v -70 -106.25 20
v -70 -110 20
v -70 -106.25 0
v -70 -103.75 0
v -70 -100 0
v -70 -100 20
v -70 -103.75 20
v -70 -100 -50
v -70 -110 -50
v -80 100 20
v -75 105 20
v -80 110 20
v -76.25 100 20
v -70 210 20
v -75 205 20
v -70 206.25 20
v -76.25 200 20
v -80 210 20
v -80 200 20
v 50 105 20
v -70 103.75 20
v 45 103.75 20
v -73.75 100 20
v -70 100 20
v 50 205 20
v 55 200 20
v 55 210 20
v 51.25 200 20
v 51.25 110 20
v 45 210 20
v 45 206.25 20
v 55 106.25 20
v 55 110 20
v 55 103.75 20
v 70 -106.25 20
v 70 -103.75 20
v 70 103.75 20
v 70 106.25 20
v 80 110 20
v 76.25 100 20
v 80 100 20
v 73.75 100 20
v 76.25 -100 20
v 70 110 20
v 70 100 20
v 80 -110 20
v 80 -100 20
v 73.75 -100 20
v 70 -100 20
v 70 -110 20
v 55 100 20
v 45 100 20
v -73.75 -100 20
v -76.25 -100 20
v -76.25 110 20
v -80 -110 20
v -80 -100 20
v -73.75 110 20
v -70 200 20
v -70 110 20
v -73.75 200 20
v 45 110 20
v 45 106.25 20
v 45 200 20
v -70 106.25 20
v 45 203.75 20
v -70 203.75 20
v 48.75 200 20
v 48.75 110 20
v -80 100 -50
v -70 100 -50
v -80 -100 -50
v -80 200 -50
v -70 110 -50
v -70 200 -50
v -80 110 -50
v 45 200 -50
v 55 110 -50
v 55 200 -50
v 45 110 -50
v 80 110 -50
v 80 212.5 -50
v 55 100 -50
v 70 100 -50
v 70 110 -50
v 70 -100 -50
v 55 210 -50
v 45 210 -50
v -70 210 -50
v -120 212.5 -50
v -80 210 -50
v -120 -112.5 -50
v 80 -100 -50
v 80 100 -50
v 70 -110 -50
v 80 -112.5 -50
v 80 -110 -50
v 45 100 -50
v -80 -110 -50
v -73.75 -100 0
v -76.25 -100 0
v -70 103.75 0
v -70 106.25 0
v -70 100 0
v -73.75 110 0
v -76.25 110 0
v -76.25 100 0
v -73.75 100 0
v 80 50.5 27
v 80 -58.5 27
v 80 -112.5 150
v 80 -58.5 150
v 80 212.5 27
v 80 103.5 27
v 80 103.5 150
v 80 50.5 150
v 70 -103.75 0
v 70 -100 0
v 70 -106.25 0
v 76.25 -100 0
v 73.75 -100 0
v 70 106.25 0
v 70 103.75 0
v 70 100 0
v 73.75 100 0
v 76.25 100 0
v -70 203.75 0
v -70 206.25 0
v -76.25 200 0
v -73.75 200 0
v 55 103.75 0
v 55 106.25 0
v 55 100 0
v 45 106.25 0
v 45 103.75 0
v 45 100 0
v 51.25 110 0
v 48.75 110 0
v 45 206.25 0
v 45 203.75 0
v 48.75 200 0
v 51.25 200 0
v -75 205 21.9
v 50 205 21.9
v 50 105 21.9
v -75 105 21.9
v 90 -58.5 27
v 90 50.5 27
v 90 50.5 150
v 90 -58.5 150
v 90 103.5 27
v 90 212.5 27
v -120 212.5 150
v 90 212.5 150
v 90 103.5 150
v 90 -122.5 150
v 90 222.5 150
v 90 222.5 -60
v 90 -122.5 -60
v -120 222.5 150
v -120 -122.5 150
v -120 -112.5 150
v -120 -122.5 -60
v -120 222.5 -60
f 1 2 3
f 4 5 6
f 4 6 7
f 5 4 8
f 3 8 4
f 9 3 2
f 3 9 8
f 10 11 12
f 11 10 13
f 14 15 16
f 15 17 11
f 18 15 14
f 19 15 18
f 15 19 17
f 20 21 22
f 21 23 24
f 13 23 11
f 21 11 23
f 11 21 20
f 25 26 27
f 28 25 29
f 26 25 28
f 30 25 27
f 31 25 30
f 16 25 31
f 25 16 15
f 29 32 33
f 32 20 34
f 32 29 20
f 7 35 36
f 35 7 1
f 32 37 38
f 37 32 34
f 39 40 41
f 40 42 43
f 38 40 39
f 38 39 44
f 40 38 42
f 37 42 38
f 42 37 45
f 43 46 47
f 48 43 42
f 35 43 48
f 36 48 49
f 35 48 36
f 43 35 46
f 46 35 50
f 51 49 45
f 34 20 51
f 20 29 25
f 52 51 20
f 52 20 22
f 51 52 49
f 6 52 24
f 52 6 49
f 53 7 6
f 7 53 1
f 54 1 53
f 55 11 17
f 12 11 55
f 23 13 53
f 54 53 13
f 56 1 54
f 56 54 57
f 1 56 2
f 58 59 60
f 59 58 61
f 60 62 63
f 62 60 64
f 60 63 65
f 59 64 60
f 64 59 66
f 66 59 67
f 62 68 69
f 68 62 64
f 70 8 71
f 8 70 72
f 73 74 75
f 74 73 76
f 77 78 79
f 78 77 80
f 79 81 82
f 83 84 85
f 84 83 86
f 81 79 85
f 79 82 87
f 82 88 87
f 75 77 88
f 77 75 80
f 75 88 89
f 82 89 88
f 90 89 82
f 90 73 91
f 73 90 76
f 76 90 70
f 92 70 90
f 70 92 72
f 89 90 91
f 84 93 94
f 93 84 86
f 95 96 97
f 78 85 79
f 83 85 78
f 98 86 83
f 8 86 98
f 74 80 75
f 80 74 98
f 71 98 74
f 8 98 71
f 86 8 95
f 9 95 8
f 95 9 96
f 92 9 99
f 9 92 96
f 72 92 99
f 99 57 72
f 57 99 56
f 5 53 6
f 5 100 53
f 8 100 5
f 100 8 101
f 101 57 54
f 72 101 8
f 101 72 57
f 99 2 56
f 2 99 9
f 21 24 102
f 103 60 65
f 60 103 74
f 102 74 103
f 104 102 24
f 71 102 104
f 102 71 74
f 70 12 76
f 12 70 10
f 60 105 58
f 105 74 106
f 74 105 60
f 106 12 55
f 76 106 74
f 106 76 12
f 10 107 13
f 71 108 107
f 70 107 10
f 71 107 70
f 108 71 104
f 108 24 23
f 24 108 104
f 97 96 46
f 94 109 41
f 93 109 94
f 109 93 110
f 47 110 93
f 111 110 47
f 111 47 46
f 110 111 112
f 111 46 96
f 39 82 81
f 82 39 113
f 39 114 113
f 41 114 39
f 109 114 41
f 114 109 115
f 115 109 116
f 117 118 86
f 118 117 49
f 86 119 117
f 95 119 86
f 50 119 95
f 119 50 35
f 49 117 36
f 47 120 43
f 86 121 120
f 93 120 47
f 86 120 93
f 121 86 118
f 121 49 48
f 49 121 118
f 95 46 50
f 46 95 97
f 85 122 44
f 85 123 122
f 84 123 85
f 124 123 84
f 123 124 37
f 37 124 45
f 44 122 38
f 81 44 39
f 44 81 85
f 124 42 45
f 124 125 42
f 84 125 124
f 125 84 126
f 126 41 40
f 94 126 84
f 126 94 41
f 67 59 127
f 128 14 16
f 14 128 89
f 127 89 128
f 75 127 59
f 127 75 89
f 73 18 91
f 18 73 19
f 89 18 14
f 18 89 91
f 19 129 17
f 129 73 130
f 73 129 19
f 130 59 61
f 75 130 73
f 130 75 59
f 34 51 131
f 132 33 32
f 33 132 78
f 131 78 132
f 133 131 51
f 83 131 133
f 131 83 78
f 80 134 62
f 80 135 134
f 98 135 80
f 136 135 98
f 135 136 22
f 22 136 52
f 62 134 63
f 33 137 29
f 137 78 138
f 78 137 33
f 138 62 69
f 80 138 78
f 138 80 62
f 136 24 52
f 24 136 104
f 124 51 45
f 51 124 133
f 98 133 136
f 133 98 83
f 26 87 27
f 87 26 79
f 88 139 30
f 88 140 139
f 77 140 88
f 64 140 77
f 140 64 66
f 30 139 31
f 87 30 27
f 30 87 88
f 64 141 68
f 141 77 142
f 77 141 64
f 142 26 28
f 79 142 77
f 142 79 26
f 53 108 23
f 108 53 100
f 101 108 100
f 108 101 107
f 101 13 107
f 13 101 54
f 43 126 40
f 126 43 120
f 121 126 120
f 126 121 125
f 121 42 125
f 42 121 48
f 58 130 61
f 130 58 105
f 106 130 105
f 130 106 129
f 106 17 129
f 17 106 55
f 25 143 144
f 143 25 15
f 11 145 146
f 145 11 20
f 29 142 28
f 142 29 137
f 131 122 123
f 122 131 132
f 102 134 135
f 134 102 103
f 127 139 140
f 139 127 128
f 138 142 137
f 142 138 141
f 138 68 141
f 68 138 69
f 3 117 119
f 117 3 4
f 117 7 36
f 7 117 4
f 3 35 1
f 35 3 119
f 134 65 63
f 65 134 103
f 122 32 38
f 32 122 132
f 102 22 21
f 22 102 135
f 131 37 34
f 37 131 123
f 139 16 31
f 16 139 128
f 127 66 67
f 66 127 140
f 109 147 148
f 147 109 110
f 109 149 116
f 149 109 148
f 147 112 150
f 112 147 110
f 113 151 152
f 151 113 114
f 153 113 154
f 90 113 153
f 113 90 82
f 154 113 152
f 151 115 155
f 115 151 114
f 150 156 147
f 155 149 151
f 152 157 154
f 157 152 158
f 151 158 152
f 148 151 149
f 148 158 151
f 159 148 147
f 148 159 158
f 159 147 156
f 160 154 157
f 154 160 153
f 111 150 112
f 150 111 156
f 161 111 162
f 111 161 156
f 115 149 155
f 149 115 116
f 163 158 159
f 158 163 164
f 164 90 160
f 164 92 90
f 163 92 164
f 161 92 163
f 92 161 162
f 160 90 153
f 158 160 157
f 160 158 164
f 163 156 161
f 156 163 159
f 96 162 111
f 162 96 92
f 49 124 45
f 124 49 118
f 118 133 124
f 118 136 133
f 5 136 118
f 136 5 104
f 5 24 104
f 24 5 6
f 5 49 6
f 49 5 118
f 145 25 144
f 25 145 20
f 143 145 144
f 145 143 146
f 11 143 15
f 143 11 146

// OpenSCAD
// file: human.scad
module halfHumanShape() {
    polygon([
        /* leg */
        [-20,0], [-10,0], [0,90], /*[-15,90],*/
        /* up to the neck */
        [0,165], [-5,165], [-5,155], [-25,155],
        /* arm */
        [-40,75], [-30,75], [-18,140]
    ]);
}

module human() {
    color("pink")
    translate([40,10,0])
    rotate([90,0,0])
    linear_extrude(10) {
        halfHumanShape();
        mirror([1,0]) halfHumanShape();
        /* head */
        translate([0,175]) circle(d=30);
    }
}
// main file
include <human.scad>;

/*
 * Stollenbauweise
 * Quermutterbolzen + Holzdübel
 * Rollbretter unter dem Bett
 * Zugang zur Heizung zum Ablesen
 * https://www.johannes-strommer.com/rechner/balkenberechnung/
 */

/* cm */
L = 320; /* overall length */
MW = 140; /* mattress width */
ML = 200; /* mattress length */
MH = 20; /* mattress height */
LX = 10; /* TODO: leg X size */
LY = 10; /* TODO: leg Y size */
LH = 70; /* leg height */
RT = 25; /* radiator thickness */
PW = MW + LX - RT; /* platform width */
echo(platform_width=PW);
PL = L - ML - 2*LY; /* platform length */
echo(platform_length=PL);
PT = 1.9; /* TODO: platform thickness */
SBD1 = 2.5; /* TODO: smaller side board dimension */
SBD2 = 20; /* TODO: larger side board dimension */

RW = 325; /* room width */
RH = 200; /* room height */
RD = 200; /* room depth */
RWT = 10; /* room wall thickness */

WZO = 77; /* window Z offset (floor to upper edge of window sill) */
WW = 109; /* window width */
WYO = [54, 216]; /* window Y offsets */

/* TODO: Schlafplatz auf der Plattform (ausklappbar?) */
/* TODO: Matratze höher setzen, Plattform niedriger, ...? */
/* TODO: kallax, window sill */
/* TODO: oberkante matratze mit fensterbrett abschließen lassen? */

/* mattress */
color("gray") translate([0,0,MH/2]) cube([MW,ML,MH], center=true);

/* platform */
color("red") translate([(PW-MW-LX)/2,(ML+LY+PL)/2,MH+PT/2]) cube([PW,PL,PT], center=true);

/* legs (mattress) */
color("red") translate([0,0,-LH/2+MH]) for (i=[-1,1]) {
    translate([i*(MW+LX)/2,0,0]) {
        for (j=[-1,1]) {
            translate([0,j*(ML+LY)/2,0]) cube([LX,LY,LH], center=true);
        }
    }
}
/* legs (platform) */
color("red") translate([0,0,-LH/2+MH]) for (i=[-1,1]) {
    translate([(PW-MW-LX)/2 + i*PW/2,0,0]) {
        for (j=[-1,1]) {
            translate([0,(ML+PL+LY)/2 + j*PL/2,0]) cube([LX,LY,LH], center=true);
        }
    }
}

color("red") translate([0,0,MH-SBD2/2]) {
    /* longer side boards (mattress) */
    for (i=[-1,1]) {
        translate([i*(MW+LX)/2,0,0]) cube([SBD1,ML,SBD2], center=true);
    }
    /* longer side boards (platform) */
    translate([0,(ML+PL+LY)/2,0]) for (x=[0,PW]) {
        translate([-(MW+LX)/2+x,0,0]) cube([SBD1,PL,SBD2], center=true);
    }

    /* shorter side boards (mattress) */
    for (i=[-(ML+LX)/2,(ML+LX)/2]) {
        translate([0,i,0]) cube([MW,SBD1,SBD2], center=true);
    }
    /* shorter side board (platform) */
    translate([-LX,(ML+LX)/2+PL,0]) cube([PW,SBD1,SBD2], center=true);
}

/* room */
color("lightgray") translate([MW/2+LX-RD,-ML/2-LY - (RW-L)/2,-LH+MH]) difference() {
    translate([0,-RWT,-RWT]) cube([RD+RWT,RW+2*RWT,RH+RWT]);
    translate([-1,0,0]) cube([RD+1,RW,RH+1]);
    /* windows */
    for (y = WYO) {
        translate([0,y,WZO]) cube([100*RWT,WW,2*RH]);
    }
}

/* humans */
module centeredHuman() {
    translate([-40,95,10]) rotate([90,0,0]) human();
}
//centeredHuman();
//translate([0,(ML+PL)/2,0]) rotate([0,0,90]) centeredHuman();
